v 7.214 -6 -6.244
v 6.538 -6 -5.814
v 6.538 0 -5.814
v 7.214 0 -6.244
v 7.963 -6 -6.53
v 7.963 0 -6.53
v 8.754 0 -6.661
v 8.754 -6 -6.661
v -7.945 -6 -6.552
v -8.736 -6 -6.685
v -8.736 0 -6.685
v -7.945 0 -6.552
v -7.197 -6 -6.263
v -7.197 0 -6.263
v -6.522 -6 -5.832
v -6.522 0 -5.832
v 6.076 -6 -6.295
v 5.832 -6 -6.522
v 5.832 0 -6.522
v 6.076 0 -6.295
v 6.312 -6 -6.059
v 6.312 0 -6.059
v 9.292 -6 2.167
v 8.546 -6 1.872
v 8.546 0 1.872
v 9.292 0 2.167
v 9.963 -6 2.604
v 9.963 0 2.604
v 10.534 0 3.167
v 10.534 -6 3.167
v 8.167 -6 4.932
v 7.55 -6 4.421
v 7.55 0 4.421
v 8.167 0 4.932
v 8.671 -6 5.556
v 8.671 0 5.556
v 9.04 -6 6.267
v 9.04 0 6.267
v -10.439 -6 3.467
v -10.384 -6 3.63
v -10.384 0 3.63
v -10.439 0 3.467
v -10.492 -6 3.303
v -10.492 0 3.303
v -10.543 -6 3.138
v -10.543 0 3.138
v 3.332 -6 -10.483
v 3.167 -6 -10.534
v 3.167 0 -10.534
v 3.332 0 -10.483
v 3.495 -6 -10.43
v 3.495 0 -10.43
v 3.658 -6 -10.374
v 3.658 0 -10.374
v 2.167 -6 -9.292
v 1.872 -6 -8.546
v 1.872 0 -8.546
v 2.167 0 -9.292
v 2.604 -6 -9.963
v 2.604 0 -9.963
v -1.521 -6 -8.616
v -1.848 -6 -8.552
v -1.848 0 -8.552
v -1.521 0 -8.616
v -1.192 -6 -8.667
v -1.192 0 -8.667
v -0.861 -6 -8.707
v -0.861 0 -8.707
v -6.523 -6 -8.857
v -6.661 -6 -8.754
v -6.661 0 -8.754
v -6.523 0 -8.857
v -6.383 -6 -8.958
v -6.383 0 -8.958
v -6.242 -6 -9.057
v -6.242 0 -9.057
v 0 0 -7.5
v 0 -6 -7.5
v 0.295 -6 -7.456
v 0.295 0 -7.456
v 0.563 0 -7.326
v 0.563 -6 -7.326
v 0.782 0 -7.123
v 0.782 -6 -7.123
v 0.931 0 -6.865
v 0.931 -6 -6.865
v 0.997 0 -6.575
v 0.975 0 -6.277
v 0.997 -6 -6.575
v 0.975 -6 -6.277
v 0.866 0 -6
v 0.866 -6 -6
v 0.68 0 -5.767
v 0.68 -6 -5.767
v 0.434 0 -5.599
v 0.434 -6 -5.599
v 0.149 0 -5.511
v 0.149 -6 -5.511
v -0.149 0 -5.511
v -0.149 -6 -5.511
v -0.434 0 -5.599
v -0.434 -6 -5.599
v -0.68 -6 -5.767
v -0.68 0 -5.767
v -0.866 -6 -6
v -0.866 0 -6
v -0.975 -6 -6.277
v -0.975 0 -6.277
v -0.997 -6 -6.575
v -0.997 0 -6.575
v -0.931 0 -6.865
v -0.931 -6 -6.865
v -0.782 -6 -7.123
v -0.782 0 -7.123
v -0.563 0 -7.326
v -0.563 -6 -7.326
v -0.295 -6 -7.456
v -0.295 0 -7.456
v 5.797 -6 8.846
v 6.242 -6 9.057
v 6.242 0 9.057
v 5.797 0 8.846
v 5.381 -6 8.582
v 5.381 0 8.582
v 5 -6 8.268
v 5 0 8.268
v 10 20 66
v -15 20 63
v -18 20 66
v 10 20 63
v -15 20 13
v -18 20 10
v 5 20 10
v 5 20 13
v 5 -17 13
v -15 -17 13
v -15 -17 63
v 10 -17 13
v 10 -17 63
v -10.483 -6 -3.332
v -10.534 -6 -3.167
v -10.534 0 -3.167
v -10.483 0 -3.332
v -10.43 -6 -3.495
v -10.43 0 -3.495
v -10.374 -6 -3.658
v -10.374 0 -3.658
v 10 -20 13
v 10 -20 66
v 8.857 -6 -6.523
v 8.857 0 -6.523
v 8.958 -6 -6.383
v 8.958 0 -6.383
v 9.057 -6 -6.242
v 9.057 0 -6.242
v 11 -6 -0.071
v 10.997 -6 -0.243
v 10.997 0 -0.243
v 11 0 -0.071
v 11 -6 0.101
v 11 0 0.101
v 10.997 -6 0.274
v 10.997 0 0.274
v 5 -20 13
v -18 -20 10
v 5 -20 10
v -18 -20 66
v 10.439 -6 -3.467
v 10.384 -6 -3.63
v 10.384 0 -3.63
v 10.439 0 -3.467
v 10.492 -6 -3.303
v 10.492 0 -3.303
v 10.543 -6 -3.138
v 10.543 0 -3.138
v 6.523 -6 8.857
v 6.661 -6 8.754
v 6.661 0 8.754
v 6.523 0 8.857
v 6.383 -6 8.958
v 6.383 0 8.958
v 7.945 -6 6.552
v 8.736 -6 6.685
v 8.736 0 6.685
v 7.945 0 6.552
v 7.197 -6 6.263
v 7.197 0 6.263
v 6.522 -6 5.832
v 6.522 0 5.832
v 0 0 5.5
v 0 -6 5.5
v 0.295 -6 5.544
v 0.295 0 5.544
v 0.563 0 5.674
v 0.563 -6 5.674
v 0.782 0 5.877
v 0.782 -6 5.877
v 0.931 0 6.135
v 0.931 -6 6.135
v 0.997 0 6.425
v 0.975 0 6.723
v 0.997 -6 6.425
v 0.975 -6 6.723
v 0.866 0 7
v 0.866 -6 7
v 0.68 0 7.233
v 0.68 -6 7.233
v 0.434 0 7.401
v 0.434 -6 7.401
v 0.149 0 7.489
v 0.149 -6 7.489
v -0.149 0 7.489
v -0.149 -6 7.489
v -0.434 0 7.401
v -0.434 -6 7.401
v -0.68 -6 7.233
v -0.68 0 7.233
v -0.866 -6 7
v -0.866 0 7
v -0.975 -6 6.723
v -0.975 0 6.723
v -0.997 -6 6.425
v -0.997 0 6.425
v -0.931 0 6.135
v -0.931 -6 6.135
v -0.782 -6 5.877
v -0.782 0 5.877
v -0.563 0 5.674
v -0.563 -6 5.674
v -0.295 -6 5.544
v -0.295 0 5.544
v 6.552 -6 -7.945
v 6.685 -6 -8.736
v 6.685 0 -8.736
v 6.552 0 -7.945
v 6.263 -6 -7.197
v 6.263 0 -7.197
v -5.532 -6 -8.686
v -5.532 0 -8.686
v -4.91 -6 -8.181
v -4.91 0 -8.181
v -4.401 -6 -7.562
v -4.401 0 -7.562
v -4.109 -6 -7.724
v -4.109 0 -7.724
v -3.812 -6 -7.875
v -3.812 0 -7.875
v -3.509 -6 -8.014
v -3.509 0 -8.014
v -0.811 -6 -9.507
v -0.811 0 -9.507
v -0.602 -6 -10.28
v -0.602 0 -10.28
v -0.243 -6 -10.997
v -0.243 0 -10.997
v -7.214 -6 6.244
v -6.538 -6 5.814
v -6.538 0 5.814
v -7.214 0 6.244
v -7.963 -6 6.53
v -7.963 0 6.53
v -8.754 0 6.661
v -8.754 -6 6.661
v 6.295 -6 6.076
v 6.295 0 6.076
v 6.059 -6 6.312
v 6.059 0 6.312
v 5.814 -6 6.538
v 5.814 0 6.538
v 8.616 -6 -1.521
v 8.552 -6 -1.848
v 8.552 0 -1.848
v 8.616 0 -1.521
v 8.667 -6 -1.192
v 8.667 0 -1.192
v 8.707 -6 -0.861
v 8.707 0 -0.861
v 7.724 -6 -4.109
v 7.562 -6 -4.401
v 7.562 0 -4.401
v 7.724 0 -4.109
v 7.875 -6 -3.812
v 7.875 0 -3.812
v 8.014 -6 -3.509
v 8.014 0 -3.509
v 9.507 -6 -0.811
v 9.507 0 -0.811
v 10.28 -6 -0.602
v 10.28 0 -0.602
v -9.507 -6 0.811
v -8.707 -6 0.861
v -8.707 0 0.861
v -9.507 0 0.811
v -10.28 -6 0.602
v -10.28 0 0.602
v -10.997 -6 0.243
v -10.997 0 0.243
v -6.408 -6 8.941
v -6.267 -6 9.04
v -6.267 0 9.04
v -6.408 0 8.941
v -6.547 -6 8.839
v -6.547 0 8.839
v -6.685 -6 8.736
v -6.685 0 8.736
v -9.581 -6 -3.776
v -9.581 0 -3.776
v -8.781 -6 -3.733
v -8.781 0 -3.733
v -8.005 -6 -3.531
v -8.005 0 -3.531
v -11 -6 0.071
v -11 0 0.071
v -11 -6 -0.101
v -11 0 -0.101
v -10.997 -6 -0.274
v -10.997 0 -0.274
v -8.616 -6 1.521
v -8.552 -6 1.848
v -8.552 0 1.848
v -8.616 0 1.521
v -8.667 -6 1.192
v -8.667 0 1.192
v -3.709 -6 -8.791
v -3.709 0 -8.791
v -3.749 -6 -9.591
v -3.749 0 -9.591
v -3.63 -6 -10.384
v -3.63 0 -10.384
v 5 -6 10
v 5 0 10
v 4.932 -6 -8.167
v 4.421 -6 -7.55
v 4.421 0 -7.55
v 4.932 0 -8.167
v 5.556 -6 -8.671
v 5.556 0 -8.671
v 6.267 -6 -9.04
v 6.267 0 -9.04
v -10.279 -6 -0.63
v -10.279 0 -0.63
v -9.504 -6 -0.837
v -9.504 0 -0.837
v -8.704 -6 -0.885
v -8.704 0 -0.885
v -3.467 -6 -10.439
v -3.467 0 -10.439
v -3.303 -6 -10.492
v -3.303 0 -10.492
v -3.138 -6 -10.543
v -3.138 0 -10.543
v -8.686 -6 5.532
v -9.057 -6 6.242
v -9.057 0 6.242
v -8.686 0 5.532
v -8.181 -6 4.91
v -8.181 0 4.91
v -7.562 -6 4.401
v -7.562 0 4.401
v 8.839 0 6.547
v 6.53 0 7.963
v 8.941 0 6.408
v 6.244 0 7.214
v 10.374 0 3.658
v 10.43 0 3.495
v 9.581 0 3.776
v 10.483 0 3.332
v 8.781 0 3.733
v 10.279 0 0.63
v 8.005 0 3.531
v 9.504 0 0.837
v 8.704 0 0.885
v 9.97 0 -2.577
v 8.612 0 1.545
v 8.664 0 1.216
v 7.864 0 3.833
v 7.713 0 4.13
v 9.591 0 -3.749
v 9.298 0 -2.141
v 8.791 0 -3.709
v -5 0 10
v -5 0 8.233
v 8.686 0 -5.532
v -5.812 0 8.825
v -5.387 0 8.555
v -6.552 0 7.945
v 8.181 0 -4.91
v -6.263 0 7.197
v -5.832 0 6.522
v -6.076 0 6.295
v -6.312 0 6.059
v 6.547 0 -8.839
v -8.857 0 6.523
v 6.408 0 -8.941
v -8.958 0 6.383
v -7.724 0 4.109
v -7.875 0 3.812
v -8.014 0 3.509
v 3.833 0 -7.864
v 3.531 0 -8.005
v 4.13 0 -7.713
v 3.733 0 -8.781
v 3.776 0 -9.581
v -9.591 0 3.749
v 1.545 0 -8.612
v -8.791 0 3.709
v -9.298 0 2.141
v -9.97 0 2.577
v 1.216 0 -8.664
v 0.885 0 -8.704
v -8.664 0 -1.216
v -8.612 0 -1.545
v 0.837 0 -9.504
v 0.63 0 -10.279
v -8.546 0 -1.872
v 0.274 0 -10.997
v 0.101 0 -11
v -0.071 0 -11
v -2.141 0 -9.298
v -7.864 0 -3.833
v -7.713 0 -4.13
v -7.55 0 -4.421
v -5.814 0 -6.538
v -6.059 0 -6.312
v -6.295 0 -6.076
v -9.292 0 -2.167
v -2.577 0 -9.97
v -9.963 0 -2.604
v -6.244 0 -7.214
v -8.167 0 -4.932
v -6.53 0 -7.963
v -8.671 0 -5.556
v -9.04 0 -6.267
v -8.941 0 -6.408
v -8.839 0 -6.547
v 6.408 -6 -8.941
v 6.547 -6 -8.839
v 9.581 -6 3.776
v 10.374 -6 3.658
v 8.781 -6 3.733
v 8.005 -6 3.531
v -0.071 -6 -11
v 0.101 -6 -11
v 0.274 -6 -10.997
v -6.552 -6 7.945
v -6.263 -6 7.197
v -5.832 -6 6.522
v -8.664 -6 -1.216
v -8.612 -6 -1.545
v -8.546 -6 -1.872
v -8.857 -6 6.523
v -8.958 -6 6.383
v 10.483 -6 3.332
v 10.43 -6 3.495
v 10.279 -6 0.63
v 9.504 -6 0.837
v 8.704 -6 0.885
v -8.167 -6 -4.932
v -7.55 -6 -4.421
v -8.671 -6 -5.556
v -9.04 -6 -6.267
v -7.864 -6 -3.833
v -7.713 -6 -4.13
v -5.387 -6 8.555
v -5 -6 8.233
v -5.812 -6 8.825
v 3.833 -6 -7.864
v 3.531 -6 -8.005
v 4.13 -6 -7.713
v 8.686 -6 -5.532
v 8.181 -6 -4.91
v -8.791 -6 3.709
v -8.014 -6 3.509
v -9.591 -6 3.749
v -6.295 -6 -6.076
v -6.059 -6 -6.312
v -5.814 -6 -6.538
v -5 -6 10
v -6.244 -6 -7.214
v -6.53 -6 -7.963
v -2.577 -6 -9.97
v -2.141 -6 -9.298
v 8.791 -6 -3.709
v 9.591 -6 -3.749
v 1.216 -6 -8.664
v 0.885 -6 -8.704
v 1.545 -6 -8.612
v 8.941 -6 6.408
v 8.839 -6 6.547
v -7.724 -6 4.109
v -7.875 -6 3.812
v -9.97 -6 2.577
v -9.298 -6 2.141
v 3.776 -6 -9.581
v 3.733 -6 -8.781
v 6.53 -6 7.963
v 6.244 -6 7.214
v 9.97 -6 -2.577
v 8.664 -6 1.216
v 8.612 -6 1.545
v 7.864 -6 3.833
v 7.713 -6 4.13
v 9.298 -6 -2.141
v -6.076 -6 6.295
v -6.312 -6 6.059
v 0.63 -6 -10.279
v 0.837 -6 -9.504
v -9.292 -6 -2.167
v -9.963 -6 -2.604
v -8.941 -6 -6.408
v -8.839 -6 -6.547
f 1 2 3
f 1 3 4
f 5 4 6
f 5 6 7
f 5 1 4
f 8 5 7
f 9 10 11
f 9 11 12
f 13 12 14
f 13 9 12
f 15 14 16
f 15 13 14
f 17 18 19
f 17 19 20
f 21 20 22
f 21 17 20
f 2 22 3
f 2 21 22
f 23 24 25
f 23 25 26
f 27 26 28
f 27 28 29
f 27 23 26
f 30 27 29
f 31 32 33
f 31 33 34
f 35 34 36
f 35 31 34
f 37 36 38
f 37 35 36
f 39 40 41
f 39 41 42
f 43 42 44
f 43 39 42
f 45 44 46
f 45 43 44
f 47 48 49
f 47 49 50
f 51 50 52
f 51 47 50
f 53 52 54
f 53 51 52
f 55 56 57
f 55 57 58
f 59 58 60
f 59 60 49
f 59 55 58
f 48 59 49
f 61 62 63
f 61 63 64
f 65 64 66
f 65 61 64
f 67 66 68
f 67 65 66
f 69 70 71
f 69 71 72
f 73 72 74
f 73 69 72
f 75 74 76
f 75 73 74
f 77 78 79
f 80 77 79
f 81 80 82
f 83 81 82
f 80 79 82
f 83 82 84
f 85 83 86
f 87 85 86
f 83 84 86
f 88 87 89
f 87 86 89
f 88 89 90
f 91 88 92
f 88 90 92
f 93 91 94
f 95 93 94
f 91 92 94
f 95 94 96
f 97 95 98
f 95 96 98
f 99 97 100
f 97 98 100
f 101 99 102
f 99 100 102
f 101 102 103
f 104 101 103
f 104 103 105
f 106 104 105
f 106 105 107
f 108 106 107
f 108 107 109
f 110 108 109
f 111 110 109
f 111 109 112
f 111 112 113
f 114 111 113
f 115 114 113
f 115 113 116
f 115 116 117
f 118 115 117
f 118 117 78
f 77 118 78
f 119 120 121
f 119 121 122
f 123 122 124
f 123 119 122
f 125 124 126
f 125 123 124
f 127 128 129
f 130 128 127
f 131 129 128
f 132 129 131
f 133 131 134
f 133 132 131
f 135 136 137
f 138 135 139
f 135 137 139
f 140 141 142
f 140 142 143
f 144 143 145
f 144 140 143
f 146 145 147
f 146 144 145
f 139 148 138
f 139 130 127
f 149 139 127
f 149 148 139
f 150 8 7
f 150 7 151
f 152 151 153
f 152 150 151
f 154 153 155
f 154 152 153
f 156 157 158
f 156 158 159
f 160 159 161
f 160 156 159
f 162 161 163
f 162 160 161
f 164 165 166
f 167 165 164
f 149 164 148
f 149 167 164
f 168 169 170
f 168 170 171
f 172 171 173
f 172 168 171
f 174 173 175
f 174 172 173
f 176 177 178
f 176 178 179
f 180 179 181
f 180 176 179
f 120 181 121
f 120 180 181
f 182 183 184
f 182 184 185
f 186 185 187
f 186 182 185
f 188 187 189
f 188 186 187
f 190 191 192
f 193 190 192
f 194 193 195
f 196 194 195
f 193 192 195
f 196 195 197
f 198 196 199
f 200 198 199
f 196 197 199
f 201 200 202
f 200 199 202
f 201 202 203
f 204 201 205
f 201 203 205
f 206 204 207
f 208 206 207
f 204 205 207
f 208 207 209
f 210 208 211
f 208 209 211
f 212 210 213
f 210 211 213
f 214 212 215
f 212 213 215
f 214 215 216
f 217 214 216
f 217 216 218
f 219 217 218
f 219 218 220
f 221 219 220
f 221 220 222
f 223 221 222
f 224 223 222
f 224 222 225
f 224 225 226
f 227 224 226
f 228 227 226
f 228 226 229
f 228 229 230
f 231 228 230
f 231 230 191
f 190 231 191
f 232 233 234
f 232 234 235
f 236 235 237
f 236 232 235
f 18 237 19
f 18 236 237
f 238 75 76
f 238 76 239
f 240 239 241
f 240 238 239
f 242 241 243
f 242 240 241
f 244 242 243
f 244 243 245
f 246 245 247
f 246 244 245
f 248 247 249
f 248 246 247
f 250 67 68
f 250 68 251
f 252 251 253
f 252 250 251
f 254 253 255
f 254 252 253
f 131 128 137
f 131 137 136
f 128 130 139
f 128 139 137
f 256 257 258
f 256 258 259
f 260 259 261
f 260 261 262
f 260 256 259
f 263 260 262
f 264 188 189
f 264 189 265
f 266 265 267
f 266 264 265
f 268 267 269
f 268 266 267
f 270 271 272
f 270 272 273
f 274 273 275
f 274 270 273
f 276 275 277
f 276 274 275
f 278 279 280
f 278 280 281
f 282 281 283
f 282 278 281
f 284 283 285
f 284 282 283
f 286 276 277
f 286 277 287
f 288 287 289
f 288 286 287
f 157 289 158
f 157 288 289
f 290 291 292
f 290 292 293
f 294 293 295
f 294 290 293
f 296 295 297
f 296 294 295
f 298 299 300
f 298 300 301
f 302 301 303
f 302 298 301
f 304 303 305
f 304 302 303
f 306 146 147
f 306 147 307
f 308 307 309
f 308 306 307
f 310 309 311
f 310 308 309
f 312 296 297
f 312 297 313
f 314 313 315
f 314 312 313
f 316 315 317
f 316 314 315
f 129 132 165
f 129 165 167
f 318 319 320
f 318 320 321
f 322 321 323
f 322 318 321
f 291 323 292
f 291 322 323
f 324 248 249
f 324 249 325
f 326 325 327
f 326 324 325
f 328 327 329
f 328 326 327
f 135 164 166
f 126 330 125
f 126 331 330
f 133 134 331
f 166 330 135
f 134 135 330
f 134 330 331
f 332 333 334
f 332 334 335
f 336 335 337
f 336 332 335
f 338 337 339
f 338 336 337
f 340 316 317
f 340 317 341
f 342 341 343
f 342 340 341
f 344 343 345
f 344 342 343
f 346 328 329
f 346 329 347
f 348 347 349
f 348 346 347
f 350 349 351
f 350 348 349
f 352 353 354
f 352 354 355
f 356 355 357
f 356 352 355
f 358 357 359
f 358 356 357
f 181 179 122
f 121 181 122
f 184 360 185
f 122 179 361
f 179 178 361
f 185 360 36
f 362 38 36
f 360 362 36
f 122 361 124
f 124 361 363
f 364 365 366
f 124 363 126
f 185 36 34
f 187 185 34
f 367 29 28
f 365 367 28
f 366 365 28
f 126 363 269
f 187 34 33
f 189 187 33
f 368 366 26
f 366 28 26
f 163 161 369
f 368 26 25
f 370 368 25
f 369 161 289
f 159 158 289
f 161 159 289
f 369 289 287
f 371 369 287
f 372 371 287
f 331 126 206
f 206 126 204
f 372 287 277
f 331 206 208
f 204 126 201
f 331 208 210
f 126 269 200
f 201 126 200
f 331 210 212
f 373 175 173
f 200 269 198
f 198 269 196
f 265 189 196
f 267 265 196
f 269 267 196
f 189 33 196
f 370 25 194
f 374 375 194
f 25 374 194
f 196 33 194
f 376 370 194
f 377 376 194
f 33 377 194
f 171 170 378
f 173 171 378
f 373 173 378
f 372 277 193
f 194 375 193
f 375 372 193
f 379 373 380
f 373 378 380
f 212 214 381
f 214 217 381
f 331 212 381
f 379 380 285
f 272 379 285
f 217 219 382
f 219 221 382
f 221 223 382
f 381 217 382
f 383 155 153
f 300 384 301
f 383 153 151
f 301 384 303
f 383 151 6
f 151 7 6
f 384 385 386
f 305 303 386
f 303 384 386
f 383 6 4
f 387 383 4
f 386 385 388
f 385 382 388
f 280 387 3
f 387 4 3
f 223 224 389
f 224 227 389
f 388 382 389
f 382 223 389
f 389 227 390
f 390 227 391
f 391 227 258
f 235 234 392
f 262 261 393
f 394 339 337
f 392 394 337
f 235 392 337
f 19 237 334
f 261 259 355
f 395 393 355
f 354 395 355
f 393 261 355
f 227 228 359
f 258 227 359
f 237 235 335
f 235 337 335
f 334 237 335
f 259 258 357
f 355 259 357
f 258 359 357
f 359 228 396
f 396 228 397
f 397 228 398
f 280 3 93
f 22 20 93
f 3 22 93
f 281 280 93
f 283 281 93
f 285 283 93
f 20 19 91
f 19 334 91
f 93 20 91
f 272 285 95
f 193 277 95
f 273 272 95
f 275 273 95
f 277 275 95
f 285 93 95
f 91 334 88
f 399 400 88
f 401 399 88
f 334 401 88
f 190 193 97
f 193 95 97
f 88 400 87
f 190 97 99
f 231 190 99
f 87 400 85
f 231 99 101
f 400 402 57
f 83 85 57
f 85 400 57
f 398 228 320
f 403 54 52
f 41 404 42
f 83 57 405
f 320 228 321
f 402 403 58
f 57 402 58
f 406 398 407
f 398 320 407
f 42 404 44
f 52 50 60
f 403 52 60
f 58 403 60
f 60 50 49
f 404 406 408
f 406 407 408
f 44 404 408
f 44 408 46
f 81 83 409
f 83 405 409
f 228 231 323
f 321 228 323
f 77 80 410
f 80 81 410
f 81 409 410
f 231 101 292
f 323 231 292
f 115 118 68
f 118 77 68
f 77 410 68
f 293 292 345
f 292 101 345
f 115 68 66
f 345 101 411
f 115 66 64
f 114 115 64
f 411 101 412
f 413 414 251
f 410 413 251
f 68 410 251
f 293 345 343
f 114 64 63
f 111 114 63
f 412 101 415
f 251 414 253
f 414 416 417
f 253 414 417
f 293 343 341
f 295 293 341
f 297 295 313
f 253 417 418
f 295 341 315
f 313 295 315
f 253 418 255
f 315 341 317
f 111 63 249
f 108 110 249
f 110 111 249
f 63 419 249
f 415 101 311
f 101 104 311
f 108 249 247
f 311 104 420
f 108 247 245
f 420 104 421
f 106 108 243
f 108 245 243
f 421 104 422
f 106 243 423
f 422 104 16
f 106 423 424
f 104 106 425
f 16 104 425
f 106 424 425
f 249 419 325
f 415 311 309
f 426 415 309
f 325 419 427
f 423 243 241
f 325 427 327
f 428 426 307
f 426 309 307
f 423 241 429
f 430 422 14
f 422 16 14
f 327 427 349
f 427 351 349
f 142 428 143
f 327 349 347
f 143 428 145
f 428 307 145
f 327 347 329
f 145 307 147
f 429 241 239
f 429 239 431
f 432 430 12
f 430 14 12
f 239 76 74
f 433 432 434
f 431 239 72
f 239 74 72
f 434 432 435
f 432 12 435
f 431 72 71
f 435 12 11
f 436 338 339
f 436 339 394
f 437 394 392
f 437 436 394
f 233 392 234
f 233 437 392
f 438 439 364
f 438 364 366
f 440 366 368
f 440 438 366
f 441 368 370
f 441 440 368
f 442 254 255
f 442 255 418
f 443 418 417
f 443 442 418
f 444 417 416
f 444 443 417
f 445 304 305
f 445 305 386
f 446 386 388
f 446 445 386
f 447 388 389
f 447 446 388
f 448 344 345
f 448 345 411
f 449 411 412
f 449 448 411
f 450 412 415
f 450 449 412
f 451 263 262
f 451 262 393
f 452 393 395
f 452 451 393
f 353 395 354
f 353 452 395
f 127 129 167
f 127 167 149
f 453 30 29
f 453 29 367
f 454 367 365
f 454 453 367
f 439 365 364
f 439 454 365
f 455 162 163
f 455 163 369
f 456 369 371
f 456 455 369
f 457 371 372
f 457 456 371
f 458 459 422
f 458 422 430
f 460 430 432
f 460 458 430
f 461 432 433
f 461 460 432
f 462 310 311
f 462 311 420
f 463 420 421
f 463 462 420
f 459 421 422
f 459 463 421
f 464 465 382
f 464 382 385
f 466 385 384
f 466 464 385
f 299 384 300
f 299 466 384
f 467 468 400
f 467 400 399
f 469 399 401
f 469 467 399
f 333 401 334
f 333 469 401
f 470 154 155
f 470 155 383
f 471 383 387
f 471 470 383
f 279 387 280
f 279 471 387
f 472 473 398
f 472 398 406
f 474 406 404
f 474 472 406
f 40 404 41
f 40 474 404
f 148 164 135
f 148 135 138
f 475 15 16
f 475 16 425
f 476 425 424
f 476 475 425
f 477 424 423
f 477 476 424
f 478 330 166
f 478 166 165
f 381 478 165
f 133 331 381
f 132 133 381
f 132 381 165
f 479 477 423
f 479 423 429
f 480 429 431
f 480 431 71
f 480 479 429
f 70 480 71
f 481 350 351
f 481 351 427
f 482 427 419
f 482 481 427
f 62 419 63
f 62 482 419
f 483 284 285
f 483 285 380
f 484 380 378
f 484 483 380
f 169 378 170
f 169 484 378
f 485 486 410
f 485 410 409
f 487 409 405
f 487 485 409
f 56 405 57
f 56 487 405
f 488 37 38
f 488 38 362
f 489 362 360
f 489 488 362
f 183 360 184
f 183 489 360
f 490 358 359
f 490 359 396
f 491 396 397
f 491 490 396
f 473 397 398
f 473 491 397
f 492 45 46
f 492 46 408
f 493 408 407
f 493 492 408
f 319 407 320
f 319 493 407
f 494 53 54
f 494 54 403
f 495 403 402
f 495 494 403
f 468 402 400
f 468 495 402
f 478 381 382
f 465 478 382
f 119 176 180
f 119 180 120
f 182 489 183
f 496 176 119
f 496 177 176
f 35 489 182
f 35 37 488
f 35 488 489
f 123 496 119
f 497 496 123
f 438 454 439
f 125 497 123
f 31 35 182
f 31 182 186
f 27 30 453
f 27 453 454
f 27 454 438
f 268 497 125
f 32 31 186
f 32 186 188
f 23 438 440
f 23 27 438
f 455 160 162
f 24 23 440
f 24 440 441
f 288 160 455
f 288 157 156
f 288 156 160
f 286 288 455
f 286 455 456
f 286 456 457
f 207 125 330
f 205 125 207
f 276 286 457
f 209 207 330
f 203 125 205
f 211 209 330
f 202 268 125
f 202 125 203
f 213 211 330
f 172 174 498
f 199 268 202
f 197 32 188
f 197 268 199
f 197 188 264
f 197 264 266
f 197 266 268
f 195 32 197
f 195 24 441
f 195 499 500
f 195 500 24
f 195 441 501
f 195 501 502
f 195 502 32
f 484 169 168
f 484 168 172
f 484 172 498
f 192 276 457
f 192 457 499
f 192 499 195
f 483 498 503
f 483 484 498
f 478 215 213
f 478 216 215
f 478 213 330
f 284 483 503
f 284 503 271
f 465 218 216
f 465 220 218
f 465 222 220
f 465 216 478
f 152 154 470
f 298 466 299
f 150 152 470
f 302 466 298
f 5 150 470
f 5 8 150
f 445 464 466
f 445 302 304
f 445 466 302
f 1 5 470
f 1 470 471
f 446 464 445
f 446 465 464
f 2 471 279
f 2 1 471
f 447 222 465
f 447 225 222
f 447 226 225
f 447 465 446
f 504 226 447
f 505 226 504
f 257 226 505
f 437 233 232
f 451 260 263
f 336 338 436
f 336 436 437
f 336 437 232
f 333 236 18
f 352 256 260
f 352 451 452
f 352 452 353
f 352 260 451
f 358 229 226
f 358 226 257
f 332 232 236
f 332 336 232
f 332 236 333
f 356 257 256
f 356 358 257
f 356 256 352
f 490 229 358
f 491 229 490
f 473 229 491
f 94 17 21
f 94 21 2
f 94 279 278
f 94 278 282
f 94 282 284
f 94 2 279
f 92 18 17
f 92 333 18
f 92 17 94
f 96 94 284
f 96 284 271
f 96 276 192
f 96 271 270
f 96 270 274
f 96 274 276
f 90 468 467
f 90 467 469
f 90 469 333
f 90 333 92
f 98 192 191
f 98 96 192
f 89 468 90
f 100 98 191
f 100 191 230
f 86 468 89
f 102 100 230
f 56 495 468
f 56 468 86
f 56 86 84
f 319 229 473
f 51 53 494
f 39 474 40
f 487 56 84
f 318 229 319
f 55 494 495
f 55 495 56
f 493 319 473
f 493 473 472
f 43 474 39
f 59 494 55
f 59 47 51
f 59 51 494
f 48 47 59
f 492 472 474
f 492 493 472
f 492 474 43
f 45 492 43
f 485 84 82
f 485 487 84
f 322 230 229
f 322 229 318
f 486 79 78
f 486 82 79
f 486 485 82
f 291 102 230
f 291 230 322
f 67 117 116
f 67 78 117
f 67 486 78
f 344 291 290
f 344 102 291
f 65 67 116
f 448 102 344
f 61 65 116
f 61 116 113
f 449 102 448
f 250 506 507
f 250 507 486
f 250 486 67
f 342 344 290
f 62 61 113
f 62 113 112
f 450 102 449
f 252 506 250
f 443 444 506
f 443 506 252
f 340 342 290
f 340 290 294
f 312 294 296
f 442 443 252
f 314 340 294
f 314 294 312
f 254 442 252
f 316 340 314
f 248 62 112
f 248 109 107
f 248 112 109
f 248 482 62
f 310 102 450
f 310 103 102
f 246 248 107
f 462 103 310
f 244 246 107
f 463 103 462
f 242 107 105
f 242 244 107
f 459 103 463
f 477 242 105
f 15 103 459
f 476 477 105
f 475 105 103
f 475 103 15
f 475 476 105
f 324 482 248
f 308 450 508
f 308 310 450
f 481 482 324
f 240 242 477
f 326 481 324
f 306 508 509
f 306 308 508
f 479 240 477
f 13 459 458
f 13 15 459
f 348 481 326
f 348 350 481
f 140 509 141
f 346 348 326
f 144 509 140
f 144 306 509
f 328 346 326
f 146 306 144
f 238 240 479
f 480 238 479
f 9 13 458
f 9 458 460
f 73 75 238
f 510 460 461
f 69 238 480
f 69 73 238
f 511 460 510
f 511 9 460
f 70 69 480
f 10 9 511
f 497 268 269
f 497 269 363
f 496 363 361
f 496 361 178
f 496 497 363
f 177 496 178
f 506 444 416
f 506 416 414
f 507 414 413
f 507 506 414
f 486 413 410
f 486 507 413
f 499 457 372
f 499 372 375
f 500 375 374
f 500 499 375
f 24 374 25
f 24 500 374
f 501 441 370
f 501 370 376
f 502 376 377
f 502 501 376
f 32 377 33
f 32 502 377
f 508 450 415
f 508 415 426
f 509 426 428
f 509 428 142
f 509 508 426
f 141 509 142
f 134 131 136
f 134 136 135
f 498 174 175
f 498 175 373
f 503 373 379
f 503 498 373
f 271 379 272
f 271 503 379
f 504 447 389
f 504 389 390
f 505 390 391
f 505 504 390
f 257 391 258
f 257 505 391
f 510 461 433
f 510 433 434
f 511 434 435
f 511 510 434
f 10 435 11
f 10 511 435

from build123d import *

# Parameters (mm, degrees)
EXTRUDE_1_DEPTH     = 6
EXTRUDE_2_DEPTH     = 20
SKETCH_3_W          = 25
SKETCH_3_H          = 50
EXTRUDE_3_DEPTH     = 3
EXTRUDE_4_DEPTH     = 6
SKETCH_5_R          = 1
CUT_EXTRUDE_1_DEPTH = 74.184697854


with BuildPart() as part:
    # 草图1 → 凸台-拉伸1 (new body)
    with BuildSketch(Plane(origin=(0, 0, 0), x_dir=(1, 0, 0), z_dir=(0, 1, 0))):
        with BuildLine():
            Line((5, 0), (5, -13))
            Line((5, -13), (-15, -13))
            Line((-15, -13), (-15, -63))
            Line((-15, -63), (10, -63))
            Line((10, -63), (10, -66))
            Line((10, -66), (-18, -66))
            Line((-18, -66), (-18, -10))
            Line((-18, -10), (-5, -10))
            Line((-5, -10), (-5, 0))
            ThreePointArc((-5, 0), (0, 5), (5, 0))
        make_face()
    extrude(amount=-EXTRUDE_1_DEPTH)

    # 草图2 → 凸台-拉伸2 (add, symmetric)
    with BuildSketch(Plane(origin=(0, 0, 0), x_dir=(1, 0, 0), z_dir=(0, 1, 0))):
        Polygon((-15, -13), (5, -13), (5, -10), (-18, -10), (-18, -66), (10, -66), (10, -63), (-15, -63), align=None)
    extrude(amount=EXTRUDE_2_DEPTH, both=True)

    # 草图3 → 凸台-拉伸3 (add)
    with BuildSketch(Plane.XZ.offset(20)):
        with Locations((-2.5, 38)):
            Rectangle(SKETCH_3_W, SKETCH_3_H)
    extrude(amount=-EXTRUDE_3_DEPTH)

    # 草图4 → 凸台-拉伸4 (add)
    with BuildSketch(Plane.XZ.offset(6)):
        with BuildLine():
            ThreePointArc((0.860680542, 8.706562468), (0.72579344, 9.898750182), (0.24342364, 10.997306258))
            ThreePointArc((0.24342364, 10.997306258), (-0.01511058, 10.999989621), (-0.273636452, 10.996595977))
            ThreePointArc((-0.273636452, 10.996595977), (-0.752986286, 9.896718796), (-0.884597491, 8.704164996))
            ThreePointArc((-0.884597491, 8.704164996), (-1.380514283, 8.639397046), (-1.871919927, 8.546397884))
            ThreePointArc((-1.871919927, 8.546397884), (-2.368611449, 9.638553371), (-3.166844887, 10.53428182))
            ThreePointArc((-3.166844887, 10.53428182), (-3.413554747, 10.456942383), (-3.658378768, 10.373825947))
            ThreePointArc((-3.658378768, 10.373825947), (-3.77438681, 9.179653342), (-3.531037114, 8.00479718))
            ThreePointArc((-3.531037114, 8.00479718), (-3.982667613, 7.789952483), (-4.421283831, 7.549652329))
            ThreePointArc((-4.421283831, 7.549652329), (-5.231160146, 8.434867801), (-6.267120572, 9.040088481))
            ThreePointArc((-6.267120572, 9.040088481), (-6.477856391, 8.890296766), (-6.685013481, 8.735593555))
            ThreePointArc((-6.685013481, 8.735593555), (-6.426324056, 7.564019461), (-5.831834222, 6.521864044))
            ThreePointArc((-5.831834222, 6.521864044), (-6.194969688, 6.177973095), (-6.537861669, 5.813894202))
            ThreePointArc((-6.537861669, 5.813894202), (-7.58164644, 6.405518601), (-8.753926829, 6.660988295))
            ThreePointArc((-8.753926829, 6.660988295), (-8.908060318, 6.453406959), (-9.057272497, 6.242260401))
            ThreePointArc((-9.057272497, 6.242260401), (-8.449207929, 5.207966653), (-7.561770763, 4.400525414))
            ThreePointArc((-7.561770763, 4.400525414), (-7.800864967, 3.961250657), (-8.014468055, 3.509031603))
            ThreePointArc((-8.014468055, 3.509031603), (-9.189988356, 3.74915261), (-10.383837737, 3.629864165))
            ThreePointArc((-10.383837737, 3.629864165), (-10.466281235, 3.384812715), (-10.542942575, 3.137891306))
            ThreePointArc((-10.542942575, 3.137891306), (-9.64502446, 2.342121783), (-8.551508496, 1.848432697))
            ThreePointArc((-8.551508496, 1.848432697), (-8.643157232, 1.356773404), (-8.706562468, 0.860680542))
            ThreePointArc((-8.706562468, 0.860680542), (-9.898750182, 0.72579344), (-10.997306258, 0.24342364))
            ThreePointArc((-10.997306258, 0.24342364), (-10.999989621, -0.01511058), (-10.996595977, -0.273636452))
            ThreePointArc((-10.996595977, -0.273636452), (-9.896718796, -0.752986286), (-8.704164996, -0.884597491))
            ThreePointArc((-8.704164996, -0.884597491), (-8.639397046, -1.380514283), (-8.546397884, -1.871919927))
            ThreePointArc((-8.546397884, -1.871919927), (-9.638553371, -2.368611449), (-10.53428182, -3.166844887))
            ThreePointArc((-10.53428182, -3.166844887), (-10.456942383, -3.413554747), (-10.373825947, -3.658378768))
            ThreePointArc((-10.373825947, -3.658378768), (-9.179653342, -3.77438681), (-8.00479718, -3.531037114))
            ThreePointArc((-8.00479718, -3.531037114), (-7.789952483, -3.982667613), (-7.549652329, -4.421283831))
            ThreePointArc((-7.549652329, -4.421283831), (-8.434867801, -5.231160146), (-9.040088481, -6.267120572))
            ThreePointArc((-9.040088481, -6.267120572), (-8.890296766, -6.477856391), (-8.735593555, -6.685013481))
            ThreePointArc((-8.735593555, -6.685013481), (-7.564019461, -6.426324056), (-6.521864044, -5.831834222))
            ThreePointArc((-6.521864044, -5.831834222), (-6.177973095, -6.194969688), (-5.813894202, -6.537861669))
            ThreePointArc((-5.813894202, -6.537861669), (-6.405518601, -7.58164644), (-6.660988295, -8.753926829))
            ThreePointArc((-6.660988295, -8.753926829), (-6.453406959, -8.908060318), (-6.242260401, -9.057272497))
            ThreePointArc((-6.242260401, -9.057272497), (-5.207966653, -8.449207929), (-4.400525414, -7.561770763))
            ThreePointArc((-4.400525414, -7.561770763), (-3.961250657, -7.800864967), (-3.509031603, -8.014468055))
            ThreePointArc((-3.509031603, -8.014468055), (-3.74915261, -9.189988356), (-3.629864165, -10.383837737))
            ThreePointArc((-3.629864165, -10.383837737), (-3.384812715, -10.466281235), (-3.137891306, -10.542942575))
            ThreePointArc((-3.137891306, -10.542942575), (-2.342121783, -9.64502446), (-1.848432697, -8.551508496))
            ThreePointArc((-1.848432697, -8.551508496), (-1.356773404, -8.643157232), (-0.860680542, -8.706562468))
            ThreePointArc((-0.860680542, -8.706562468), (-0.72579344, -9.898750182), (-0.24342364, -10.997306258))
            ThreePointArc((-0.24342364, -10.997306258), (0.01511058, -10.999989621), (0.273636452, -10.996595977))
            ThreePointArc((0.273636452, -10.996595977), (0.752986286, -9.896718796), (0.884597491, -8.704164996))
            ThreePointArc((0.884597491, -8.704164996), (1.380514283, -8.639397046), (1.871919927, -8.546397884))
            ThreePointArc((1.871919927, -8.546397884), (2.368611449, -9.638553371), (3.166844887, -10.53428182))
            ThreePointArc((3.166844887, -10.53428182), (3.413554747, -10.456942383), (3.658378768, -10.373825947))
            ThreePointArc((3.658378768, -10.373825947), (3.77438681, -9.179653342), (3.531037114, -8.00479718))
            ThreePointArc((3.531037114, -8.00479718), (3.982667613, -7.789952483), (4.421283831, -7.549652329))
            ThreePointArc((4.421283831, -7.549652329), (5.231160146, -8.434867801), (6.267120572, -9.040088481))
            ThreePointArc((6.267120572, -9.040088481), (6.477856391, -8.890296766), (6.685013481, -8.735593555))
            ThreePointArc((6.685013481, -8.735593555), (6.426324056, -7.564019461), (5.831834222, -6.521864044))
            ThreePointArc((5.831834222, -6.521864044), (6.194969688, -6.177973095), (6.537861669, -5.813894202))
            ThreePointArc((6.537861669, -5.813894202), (7.58164644, -6.405518601), (8.753926829, -6.660988295))
            ThreePointArc((8.753926829, -6.660988295), (8.908060318, -6.453406959), (9.057272497, -6.242260401))
            ThreePointArc((9.057272497, -6.242260401), (8.449207929, -5.207966653), (7.561770763, -4.400525414))
            ThreePointArc((7.561770763, -4.400525414), (7.800864967, -3.961250657), (8.014468055, -3.509031603))
            ThreePointArc((8.014468055, -3.509031603), (9.189988356, -3.74915261), (10.383837737, -3.629864165))
            ThreePointArc((10.383837737, -3.629864165), (10.466281235, -3.384812715), (10.542942575, -3.137891306))
            ThreePointArc((10.542942575, -3.137891306), (9.64502446, -2.342121783), (8.551508496, -1.848432697))
            ThreePointArc((8.551508496, -1.848432697), (8.643157232, -1.356773404), (8.706562468, -0.860680542))
            ThreePointArc((8.706562468, -0.860680542), (9.898750182, -0.72579344), (10.997306258, -0.24342364))
            ThreePointArc((10.997306258, -0.24342364), (10.999989621, 0.01511058), (10.996595977, 0.273636452))
            ThreePointArc((10.996595977, 0.273636452), (9.896718796, 0.752986286), (8.704164996, 0.884597491))
            ThreePointArc((8.704164996, 0.884597491), (8.639397046, 1.380514283), (8.546397884, 1.871919927))
            ThreePointArc((8.546397884, 1.871919927), (9.638553371, 2.368611449), (10.53428182, 3.166844887))
            ThreePointArc((10.53428182, 3.166844887), (10.456942383, 3.413554747), (10.373825947, 3.658378768))
            ThreePointArc((10.373825947, 3.658378768), (9.179653342, 3.77438681), (8.00479718, 3.531037114))
            ThreePointArc((8.00479718, 3.531037114), (7.789952483, 3.982667613), (7.549652329, 4.421283831))
            ThreePointArc((7.549652329, 4.421283831), (8.434867801, 5.231160146), (9.040088481, 6.267120572))
            ThreePointArc((9.040088481, 6.267120572), (8.890296766, 6.477856391), (8.735593555, 6.685013481))
            ThreePointArc((8.735593555, 6.685013481), (7.564019461, 6.426324056), (6.521864044, 5.831834222))
            ThreePointArc((6.521864044, 5.831834222), (6.177973095, 6.194969688), (5.813894202, 6.537861669))
            ThreePointArc((5.813894202, 6.537861669), (6.405518601, 7.58164644), (6.660988295, 8.753926829))
            ThreePointArc((6.660988295, 8.753926829), (6.453406959, 8.908060318), (6.242260401, 9.057272497))
            ThreePointArc((6.242260401, 9.057272497), (5.207966653, 8.449207929), (4.400525414, 7.561770763))
            ThreePointArc((4.400525414, 7.561770763), (3.961250657, 7.800864967), (3.509031603, 8.014468055))
            ThreePointArc((3.509031603, 8.014468055), (3.74915261, 9.189988356), (3.629864165, 10.383837737))
            ThreePointArc((3.629864165, 10.383837737), (3.384812715, 10.466281235), (3.137891306, 10.542942575))
            ThreePointArc((3.137891306, 10.542942575), (2.342121783, 9.64502446), (1.848432697, 8.551508496))
            ThreePointArc((1.848432697, 8.551508496), (1.356773404, 8.643157232), (0.860680542, 8.706562468))
        make_face()
    extrude(amount=-EXTRUDE_4_DEPTH)

    # 草图5 → 切除-拉伸1 (cut, through all)
    with BuildSketch(Plane.XZ.offset(6)):
        with Locations(Location((0, 6.5, 0), (0, 0, 270))):
            Circle(SKETCH_5_R)
        with Locations(Location((0, -6.5, 0), (0, 0, 270))):
            Circle(SKETCH_5_R)
    extrude(amount=-CUT_EXTRUDE_1_DEPTH, mode=Mode.SUBTRACT)


solid = part.part
